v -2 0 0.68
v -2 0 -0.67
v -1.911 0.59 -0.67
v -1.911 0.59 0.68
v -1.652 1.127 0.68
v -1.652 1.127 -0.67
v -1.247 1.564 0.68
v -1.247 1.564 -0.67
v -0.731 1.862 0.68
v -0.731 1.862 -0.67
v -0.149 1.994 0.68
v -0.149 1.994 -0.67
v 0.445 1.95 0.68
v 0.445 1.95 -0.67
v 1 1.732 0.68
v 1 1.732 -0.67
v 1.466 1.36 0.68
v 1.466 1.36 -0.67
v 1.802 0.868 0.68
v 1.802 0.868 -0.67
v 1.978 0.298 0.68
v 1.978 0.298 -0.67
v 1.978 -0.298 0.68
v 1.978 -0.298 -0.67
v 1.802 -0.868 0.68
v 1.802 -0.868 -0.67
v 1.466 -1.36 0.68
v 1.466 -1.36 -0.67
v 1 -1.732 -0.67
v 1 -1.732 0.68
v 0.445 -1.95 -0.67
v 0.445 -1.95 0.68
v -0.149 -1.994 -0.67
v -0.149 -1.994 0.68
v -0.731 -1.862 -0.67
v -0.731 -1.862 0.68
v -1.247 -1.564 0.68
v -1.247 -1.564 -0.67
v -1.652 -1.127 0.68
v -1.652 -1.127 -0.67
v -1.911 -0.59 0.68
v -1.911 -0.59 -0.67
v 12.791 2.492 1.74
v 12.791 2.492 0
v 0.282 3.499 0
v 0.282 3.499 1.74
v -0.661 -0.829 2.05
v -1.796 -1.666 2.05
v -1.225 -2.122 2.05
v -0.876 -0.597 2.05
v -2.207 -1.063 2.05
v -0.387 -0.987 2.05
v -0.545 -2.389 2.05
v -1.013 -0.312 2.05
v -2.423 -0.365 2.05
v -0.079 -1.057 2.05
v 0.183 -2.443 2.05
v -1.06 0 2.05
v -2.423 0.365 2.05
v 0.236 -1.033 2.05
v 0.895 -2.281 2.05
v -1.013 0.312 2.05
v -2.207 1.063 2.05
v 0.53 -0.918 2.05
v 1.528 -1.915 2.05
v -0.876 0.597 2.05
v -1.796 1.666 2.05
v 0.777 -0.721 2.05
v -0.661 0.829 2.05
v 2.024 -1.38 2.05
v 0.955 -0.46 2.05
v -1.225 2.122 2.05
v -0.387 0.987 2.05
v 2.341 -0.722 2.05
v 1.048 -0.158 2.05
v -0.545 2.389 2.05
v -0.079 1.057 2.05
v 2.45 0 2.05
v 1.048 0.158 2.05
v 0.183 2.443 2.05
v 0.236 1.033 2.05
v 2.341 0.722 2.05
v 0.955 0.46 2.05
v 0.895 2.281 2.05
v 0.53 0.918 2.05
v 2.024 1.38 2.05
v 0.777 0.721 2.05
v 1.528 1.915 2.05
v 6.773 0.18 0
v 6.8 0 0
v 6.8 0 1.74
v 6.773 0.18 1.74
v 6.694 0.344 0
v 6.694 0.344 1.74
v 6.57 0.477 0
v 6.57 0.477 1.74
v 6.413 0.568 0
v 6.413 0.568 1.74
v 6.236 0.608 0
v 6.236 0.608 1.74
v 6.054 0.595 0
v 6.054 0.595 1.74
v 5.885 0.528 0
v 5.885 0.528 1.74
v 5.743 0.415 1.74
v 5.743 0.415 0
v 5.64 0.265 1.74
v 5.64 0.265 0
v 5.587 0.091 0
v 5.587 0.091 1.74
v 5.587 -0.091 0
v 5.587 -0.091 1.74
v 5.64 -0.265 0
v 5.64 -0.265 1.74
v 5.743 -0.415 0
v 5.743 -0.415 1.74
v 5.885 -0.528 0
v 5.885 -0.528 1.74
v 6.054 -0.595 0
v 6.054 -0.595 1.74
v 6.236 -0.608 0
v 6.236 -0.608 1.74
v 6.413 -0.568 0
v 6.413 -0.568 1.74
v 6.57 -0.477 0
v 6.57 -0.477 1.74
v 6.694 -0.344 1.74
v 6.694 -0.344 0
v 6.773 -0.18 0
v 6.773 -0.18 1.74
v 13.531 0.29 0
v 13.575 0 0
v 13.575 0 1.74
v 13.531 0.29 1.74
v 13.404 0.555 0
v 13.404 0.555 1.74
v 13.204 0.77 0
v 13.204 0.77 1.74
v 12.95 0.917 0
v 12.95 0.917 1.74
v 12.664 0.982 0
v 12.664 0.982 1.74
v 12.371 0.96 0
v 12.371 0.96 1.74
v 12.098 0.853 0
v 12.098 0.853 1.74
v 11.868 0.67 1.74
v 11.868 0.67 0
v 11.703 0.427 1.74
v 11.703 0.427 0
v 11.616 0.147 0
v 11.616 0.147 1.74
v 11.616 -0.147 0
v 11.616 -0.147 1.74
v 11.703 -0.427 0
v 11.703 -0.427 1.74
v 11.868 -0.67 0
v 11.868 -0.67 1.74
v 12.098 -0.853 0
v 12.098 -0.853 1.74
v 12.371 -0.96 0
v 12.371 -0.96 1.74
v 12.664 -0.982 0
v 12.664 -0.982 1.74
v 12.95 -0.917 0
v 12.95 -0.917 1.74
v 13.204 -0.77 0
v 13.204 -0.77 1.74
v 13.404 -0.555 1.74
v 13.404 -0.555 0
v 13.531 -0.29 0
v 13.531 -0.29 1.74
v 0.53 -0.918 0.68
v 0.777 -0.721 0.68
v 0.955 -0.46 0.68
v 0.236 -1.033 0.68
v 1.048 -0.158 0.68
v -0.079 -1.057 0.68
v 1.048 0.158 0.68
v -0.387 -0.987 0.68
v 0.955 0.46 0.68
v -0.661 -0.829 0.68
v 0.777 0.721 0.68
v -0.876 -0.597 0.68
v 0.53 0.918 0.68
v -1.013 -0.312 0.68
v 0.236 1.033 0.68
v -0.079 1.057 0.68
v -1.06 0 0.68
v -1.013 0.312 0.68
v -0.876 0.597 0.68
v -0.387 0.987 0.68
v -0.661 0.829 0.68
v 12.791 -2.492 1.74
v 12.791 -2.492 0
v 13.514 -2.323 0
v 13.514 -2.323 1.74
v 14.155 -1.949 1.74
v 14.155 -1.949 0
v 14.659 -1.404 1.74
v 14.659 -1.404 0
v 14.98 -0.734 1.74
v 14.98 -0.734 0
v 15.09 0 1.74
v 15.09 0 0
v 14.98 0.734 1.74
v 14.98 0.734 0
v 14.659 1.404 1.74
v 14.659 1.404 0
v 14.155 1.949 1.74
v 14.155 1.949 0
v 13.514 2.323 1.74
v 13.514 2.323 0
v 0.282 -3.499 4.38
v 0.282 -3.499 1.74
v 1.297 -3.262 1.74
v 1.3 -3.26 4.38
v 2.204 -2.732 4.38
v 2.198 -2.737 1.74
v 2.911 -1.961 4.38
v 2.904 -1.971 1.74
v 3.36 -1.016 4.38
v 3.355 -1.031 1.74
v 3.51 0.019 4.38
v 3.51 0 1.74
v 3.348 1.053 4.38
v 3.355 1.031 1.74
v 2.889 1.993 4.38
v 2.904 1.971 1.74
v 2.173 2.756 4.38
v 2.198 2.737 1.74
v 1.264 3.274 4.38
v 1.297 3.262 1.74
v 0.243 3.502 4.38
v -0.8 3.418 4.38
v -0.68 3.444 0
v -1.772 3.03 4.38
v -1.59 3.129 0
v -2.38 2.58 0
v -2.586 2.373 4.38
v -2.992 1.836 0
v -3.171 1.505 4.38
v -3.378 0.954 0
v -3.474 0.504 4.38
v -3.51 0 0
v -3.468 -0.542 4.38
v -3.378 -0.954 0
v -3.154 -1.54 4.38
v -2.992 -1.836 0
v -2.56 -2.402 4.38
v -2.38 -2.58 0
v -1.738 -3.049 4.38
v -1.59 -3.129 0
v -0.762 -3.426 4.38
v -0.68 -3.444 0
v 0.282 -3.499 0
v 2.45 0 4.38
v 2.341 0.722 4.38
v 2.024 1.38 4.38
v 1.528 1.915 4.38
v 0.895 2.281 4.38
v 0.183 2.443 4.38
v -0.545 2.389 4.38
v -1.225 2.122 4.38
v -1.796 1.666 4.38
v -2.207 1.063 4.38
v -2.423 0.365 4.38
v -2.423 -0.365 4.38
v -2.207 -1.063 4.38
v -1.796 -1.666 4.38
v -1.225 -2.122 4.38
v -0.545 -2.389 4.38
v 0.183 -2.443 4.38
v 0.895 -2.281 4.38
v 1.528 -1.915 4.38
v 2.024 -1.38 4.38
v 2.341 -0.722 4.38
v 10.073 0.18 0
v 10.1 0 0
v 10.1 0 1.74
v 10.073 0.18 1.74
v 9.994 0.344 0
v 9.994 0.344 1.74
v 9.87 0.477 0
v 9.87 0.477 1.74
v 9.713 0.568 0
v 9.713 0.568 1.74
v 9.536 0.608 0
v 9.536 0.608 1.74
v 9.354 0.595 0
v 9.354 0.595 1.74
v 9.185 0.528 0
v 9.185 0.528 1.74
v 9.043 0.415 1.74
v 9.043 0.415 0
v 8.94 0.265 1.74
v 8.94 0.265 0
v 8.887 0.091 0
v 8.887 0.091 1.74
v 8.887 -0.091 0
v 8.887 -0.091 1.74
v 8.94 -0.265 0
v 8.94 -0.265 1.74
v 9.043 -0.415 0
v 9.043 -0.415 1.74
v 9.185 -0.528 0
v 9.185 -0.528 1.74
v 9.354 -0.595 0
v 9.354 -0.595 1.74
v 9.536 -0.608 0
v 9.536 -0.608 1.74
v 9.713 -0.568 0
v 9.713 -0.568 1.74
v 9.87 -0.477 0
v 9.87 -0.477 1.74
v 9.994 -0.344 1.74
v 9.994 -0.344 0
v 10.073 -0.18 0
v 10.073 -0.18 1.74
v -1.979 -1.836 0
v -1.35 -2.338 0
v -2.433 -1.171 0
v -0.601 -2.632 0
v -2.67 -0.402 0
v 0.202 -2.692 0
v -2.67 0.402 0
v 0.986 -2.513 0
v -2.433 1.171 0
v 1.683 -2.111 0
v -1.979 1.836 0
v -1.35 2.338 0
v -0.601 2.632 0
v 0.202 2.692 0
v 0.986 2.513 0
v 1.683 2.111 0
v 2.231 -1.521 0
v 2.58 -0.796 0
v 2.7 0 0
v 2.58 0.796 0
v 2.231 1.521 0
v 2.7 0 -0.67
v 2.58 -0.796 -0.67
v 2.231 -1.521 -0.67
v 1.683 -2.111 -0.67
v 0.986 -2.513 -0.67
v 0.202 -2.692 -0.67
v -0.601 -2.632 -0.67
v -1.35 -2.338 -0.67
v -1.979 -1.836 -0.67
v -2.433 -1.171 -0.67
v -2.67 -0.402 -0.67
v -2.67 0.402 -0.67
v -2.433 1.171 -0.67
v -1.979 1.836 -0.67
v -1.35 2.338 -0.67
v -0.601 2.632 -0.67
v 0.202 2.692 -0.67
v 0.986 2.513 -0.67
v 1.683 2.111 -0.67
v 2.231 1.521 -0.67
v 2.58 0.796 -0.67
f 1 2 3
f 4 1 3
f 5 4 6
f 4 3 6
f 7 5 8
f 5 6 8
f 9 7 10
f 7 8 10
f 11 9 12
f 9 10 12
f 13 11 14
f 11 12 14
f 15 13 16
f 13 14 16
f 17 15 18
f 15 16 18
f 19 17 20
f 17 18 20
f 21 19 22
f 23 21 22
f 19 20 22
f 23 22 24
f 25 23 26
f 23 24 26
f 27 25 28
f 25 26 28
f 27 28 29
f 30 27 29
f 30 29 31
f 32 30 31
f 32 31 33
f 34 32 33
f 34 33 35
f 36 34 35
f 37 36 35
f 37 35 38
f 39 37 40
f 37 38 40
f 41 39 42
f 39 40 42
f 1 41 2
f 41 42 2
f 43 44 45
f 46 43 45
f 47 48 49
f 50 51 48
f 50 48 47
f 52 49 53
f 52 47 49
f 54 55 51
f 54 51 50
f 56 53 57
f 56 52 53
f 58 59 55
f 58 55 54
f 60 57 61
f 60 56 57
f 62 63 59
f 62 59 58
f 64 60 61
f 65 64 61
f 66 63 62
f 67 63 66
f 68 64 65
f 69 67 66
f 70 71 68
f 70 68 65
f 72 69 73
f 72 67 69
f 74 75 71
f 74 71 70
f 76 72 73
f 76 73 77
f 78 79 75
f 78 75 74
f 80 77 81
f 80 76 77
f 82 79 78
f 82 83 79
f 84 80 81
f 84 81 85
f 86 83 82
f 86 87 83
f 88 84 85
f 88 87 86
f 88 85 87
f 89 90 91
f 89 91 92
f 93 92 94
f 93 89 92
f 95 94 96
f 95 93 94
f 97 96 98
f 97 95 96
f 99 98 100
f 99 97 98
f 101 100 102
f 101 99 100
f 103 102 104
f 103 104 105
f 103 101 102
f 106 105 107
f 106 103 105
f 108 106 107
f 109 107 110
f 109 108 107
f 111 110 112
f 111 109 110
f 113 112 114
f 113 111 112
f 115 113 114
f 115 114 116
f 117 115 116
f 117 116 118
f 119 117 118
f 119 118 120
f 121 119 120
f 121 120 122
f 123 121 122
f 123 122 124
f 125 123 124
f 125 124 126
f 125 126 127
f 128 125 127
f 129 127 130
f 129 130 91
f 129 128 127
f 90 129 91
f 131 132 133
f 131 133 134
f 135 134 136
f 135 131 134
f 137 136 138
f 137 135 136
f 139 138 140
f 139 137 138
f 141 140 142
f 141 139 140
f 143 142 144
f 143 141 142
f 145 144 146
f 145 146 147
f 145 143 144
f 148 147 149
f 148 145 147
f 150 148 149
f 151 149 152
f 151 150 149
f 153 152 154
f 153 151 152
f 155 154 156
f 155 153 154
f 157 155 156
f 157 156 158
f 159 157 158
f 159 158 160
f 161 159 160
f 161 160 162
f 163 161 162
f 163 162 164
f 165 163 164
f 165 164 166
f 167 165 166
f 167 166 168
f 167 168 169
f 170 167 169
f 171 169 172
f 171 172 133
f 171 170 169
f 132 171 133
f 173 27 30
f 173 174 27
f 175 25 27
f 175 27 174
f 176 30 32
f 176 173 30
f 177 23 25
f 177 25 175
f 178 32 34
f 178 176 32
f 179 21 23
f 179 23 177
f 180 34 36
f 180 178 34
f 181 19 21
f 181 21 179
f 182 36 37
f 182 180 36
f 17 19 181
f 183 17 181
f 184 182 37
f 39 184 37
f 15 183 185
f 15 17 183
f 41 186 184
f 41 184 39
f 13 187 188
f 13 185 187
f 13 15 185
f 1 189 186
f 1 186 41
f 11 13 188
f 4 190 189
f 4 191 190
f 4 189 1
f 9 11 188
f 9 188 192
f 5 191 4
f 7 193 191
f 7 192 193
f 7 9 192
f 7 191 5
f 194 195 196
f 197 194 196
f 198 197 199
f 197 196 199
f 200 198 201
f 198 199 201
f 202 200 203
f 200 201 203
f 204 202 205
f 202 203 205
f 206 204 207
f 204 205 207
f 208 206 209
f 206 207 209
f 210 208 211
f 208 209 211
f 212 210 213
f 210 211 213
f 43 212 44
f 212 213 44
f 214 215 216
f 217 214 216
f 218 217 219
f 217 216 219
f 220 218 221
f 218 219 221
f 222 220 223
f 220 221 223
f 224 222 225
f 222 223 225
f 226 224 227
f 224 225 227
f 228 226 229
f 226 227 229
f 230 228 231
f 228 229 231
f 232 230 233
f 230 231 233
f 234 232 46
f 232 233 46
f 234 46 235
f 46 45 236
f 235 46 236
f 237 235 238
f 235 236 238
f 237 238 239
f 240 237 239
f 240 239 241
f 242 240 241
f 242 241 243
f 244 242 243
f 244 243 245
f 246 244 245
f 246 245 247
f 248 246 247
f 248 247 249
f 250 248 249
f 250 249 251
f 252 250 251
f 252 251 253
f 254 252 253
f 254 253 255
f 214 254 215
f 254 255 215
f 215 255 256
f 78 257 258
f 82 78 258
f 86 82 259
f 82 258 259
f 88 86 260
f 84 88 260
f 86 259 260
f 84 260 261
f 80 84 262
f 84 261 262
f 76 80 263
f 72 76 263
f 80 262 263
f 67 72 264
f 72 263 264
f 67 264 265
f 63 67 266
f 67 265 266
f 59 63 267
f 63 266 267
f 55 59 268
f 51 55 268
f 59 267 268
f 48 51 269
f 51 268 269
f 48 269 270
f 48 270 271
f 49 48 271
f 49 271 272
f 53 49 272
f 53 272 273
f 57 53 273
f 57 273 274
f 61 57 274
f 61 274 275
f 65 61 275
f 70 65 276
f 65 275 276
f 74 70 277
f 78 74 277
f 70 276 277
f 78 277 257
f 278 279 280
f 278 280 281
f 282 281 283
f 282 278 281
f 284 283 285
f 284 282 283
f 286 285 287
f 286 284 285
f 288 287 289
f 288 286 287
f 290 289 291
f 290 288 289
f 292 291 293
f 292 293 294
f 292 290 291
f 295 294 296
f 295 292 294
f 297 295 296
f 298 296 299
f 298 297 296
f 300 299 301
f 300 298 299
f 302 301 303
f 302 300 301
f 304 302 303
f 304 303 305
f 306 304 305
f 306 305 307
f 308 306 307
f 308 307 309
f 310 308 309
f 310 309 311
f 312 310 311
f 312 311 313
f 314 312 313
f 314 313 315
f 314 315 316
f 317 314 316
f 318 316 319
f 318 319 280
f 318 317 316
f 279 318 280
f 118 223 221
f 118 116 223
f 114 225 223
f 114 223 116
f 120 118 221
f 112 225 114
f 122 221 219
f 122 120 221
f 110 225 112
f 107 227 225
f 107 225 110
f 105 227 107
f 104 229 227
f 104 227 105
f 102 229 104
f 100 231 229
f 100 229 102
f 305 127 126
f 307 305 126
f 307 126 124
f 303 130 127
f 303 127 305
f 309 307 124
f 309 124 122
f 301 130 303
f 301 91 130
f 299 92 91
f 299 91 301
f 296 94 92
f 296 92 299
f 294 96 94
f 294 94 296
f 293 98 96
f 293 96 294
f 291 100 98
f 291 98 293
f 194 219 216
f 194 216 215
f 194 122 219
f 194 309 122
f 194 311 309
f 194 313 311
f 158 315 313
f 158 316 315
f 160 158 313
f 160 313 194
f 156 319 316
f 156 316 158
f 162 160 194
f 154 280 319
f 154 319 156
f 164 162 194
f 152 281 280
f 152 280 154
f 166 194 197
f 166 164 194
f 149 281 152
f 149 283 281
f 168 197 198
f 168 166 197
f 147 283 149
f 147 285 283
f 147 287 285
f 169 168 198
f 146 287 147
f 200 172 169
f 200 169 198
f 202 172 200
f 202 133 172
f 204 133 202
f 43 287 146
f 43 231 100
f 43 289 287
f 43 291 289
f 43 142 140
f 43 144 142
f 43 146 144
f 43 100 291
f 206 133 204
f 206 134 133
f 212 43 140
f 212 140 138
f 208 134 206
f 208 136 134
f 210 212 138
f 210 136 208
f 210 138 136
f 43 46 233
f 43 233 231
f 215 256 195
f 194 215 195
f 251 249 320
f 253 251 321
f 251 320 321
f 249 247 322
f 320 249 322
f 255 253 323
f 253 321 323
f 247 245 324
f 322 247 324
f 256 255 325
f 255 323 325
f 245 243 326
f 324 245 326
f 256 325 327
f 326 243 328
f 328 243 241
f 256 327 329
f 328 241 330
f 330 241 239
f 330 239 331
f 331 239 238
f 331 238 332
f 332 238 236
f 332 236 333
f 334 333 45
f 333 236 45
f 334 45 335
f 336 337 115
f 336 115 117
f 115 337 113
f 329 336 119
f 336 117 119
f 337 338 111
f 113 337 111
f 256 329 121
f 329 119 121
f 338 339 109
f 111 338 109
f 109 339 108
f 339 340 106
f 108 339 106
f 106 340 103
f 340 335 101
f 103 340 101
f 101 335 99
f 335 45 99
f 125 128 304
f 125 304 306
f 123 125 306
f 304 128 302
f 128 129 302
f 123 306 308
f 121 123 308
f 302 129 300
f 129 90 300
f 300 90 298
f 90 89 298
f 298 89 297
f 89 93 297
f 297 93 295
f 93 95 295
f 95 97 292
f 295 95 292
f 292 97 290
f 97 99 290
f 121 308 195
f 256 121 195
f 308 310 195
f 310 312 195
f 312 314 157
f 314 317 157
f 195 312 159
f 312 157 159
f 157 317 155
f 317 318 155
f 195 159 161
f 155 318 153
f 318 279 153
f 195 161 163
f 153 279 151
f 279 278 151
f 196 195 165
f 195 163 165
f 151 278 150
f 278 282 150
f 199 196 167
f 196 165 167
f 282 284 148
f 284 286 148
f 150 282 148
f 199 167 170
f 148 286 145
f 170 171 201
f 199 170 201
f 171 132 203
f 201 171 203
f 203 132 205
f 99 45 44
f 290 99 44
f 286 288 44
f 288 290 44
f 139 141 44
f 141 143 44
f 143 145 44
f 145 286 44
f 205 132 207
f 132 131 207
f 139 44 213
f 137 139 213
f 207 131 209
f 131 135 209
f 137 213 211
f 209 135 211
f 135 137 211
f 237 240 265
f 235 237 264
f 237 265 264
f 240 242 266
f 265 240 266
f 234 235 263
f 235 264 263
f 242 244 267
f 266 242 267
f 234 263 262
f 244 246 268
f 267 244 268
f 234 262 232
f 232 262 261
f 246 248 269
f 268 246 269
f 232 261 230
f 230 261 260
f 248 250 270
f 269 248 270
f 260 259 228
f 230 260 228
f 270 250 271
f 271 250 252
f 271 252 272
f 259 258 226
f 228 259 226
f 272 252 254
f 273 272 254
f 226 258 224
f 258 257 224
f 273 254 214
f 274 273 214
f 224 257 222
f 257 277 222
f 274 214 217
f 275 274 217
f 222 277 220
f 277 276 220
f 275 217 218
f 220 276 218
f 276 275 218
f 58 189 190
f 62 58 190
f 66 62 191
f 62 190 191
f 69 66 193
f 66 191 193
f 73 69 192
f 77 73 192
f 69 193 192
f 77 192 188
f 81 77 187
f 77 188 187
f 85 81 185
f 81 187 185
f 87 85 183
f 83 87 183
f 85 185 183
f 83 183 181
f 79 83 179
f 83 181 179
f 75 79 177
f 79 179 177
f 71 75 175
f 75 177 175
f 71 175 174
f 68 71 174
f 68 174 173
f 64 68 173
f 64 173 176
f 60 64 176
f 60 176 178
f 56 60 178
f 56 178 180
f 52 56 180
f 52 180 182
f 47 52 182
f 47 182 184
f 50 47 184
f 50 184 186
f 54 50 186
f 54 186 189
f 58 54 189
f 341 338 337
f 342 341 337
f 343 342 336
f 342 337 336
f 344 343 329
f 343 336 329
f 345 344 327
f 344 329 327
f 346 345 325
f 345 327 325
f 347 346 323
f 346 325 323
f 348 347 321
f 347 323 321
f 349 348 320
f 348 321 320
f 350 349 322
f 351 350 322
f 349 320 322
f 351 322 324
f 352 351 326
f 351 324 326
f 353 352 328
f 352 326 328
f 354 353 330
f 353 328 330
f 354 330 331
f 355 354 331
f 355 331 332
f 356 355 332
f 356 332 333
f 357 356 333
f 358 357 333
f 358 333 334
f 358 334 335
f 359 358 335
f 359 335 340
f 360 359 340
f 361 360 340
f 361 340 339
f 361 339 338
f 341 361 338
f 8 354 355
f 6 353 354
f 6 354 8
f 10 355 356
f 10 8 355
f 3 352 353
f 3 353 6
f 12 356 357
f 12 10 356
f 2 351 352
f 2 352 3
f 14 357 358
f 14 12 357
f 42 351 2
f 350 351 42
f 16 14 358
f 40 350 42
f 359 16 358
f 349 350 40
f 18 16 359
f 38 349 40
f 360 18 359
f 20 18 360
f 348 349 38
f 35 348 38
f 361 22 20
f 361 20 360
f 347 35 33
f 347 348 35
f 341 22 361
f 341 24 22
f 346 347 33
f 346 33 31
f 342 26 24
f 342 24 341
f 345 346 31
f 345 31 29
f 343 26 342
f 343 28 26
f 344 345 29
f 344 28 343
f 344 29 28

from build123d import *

# Parameters (mm, degrees)
SCHIZZO1_R                   = 0.61
SCHIZZO1_R_2                 = 0.985
ESTRUSIONE_ESTRUSIONE1_DEPTH = 1.74
ESTRUSIONE_ESTRUSIONE2_START = -1.74
SCHIZZO2_R                   = 3.51
ESTRUSIONE_ESTRUSIONE2_DEPTH = 4.38
ESTRUSIONE_ESTRUSIONE3_START = -4.38
SCHIZZO3_R                   = 2.7
ESTRUSIONE_ESTRUSIONE3_DEPTH = 5.05
SCHIZZO4_R                   = 2.45
TAGLIO_ESTRUSIONE1_DEPTH     = 2.33
SCHIZZO5_R                   = 2
TAGLIO_ESTRUSIONE2_DEPTH     = 1.35
TAGLIO_ESTRUSIONE3_REACH     = 17.929
SCHIZZO6_R                   = 1.06


with BuildPart() as part:
    # Schizzo1 → Estrusione-Estrusione1 (new body)
    with BuildSketch(Plane.XY):
        with BuildLine():
            Line((12.790555997, 2.491942474), (0.28158062, 3.498687233))
            ThreePointArc((0.28158062, 3.498687233), (-3.51, 0), (0.28158062, -3.498687233))
            Line((0.28158062, -3.498687233), (12.790555997, -2.491942474))
            ThreePointArc((12.790555997, -2.491942474), (15.09, 0), (12.790555997, 2.491942474))
        make_face()
        with Locations((9.49, 0)):
            Circle(SCHIZZO1_R, mode=Mode.SUBTRACT)
        with Locations((6.19, 0)):
            Circle(SCHIZZO1_R, mode=Mode.SUBTRACT)
        with Locations((12.59, 0)):
            Circle(SCHIZZO1_R_2, mode=Mode.SUBTRACT)
    extrude(amount=ESTRUSIONE_ESTRUSIONE1_DEPTH)

    # Schizzo2 → Estrusione-Estrusione2 (add)
    with BuildSketch(Plane.XY.offset(1.74).offset(ESTRUSIONE_ESTRUSIONE2_START)):
        with Locations(Location((0, 0, 0), (0, 0, 274.601349332))):
            Circle(SCHIZZO2_R)
    extrude(amount=ESTRUSIONE_ESTRUSIONE2_DEPTH)

    # Schizzo3 → Estrusione-Estrusione3 (add)
    with BuildSketch(Plane(origin=(0, 0, 0), x_dir=(-1, 0, 0), z_dir=(0, 0, -1)).offset(ESTRUSIONE_ESTRUSIONE3_START)):
        with Locations(Location((0, 0, 0), (0, 0, 180))):
            Circle(SCHIZZO3_R)
    extrude(amount=ESTRUSIONE_ESTRUSIONE3_DEPTH)

    # Schizzo4 → Taglio-Estrusione1 (cut)
    with BuildSketch(Plane.XY.offset(4.38)):
        Circle(SCHIZZO4_R)
    extrude(amount=-TAGLIO_ESTRUSIONE1_DEPTH, mode=Mode.SUBTRACT)

    # Schizzo5 → Taglio-Estrusione2 (cut)
    with BuildSketch(Plane(origin=(0, 0, -0.67), x_dir=(-1, 0, 0), z_dir=(0, 0, -1))):
        Circle(SCHIZZO5_R)
    extrude(amount=-TAGLIO_ESTRUSIONE2_DEPTH, mode=Mode.SUBTRACT)

    # Schizzo6 → Taglio-Estrusione3 (cut, up to next)
    with BuildSketch(Plane(origin=(0, 0, 0.68), x_dir=(-1, 0, 0), z_dir=(0, 0, -1)), mode=Mode.PRIVATE) as taglio_estrusione3_sk1:
        Circle(SCHIZZO6_R)
    taglio_estrusione3_tool1 = extrude(taglio_estrusione3_sk1.sketch, amount=-TAGLIO_ESTRUSIONE3_REACH, mode=Mode.PRIVATE) & part.part
    add(taglio_estrusione3_tool1.solids().sort_by_distance((0, 0, 0.68))[0], mode=Mode.SUBTRACT)


solid = part.part
